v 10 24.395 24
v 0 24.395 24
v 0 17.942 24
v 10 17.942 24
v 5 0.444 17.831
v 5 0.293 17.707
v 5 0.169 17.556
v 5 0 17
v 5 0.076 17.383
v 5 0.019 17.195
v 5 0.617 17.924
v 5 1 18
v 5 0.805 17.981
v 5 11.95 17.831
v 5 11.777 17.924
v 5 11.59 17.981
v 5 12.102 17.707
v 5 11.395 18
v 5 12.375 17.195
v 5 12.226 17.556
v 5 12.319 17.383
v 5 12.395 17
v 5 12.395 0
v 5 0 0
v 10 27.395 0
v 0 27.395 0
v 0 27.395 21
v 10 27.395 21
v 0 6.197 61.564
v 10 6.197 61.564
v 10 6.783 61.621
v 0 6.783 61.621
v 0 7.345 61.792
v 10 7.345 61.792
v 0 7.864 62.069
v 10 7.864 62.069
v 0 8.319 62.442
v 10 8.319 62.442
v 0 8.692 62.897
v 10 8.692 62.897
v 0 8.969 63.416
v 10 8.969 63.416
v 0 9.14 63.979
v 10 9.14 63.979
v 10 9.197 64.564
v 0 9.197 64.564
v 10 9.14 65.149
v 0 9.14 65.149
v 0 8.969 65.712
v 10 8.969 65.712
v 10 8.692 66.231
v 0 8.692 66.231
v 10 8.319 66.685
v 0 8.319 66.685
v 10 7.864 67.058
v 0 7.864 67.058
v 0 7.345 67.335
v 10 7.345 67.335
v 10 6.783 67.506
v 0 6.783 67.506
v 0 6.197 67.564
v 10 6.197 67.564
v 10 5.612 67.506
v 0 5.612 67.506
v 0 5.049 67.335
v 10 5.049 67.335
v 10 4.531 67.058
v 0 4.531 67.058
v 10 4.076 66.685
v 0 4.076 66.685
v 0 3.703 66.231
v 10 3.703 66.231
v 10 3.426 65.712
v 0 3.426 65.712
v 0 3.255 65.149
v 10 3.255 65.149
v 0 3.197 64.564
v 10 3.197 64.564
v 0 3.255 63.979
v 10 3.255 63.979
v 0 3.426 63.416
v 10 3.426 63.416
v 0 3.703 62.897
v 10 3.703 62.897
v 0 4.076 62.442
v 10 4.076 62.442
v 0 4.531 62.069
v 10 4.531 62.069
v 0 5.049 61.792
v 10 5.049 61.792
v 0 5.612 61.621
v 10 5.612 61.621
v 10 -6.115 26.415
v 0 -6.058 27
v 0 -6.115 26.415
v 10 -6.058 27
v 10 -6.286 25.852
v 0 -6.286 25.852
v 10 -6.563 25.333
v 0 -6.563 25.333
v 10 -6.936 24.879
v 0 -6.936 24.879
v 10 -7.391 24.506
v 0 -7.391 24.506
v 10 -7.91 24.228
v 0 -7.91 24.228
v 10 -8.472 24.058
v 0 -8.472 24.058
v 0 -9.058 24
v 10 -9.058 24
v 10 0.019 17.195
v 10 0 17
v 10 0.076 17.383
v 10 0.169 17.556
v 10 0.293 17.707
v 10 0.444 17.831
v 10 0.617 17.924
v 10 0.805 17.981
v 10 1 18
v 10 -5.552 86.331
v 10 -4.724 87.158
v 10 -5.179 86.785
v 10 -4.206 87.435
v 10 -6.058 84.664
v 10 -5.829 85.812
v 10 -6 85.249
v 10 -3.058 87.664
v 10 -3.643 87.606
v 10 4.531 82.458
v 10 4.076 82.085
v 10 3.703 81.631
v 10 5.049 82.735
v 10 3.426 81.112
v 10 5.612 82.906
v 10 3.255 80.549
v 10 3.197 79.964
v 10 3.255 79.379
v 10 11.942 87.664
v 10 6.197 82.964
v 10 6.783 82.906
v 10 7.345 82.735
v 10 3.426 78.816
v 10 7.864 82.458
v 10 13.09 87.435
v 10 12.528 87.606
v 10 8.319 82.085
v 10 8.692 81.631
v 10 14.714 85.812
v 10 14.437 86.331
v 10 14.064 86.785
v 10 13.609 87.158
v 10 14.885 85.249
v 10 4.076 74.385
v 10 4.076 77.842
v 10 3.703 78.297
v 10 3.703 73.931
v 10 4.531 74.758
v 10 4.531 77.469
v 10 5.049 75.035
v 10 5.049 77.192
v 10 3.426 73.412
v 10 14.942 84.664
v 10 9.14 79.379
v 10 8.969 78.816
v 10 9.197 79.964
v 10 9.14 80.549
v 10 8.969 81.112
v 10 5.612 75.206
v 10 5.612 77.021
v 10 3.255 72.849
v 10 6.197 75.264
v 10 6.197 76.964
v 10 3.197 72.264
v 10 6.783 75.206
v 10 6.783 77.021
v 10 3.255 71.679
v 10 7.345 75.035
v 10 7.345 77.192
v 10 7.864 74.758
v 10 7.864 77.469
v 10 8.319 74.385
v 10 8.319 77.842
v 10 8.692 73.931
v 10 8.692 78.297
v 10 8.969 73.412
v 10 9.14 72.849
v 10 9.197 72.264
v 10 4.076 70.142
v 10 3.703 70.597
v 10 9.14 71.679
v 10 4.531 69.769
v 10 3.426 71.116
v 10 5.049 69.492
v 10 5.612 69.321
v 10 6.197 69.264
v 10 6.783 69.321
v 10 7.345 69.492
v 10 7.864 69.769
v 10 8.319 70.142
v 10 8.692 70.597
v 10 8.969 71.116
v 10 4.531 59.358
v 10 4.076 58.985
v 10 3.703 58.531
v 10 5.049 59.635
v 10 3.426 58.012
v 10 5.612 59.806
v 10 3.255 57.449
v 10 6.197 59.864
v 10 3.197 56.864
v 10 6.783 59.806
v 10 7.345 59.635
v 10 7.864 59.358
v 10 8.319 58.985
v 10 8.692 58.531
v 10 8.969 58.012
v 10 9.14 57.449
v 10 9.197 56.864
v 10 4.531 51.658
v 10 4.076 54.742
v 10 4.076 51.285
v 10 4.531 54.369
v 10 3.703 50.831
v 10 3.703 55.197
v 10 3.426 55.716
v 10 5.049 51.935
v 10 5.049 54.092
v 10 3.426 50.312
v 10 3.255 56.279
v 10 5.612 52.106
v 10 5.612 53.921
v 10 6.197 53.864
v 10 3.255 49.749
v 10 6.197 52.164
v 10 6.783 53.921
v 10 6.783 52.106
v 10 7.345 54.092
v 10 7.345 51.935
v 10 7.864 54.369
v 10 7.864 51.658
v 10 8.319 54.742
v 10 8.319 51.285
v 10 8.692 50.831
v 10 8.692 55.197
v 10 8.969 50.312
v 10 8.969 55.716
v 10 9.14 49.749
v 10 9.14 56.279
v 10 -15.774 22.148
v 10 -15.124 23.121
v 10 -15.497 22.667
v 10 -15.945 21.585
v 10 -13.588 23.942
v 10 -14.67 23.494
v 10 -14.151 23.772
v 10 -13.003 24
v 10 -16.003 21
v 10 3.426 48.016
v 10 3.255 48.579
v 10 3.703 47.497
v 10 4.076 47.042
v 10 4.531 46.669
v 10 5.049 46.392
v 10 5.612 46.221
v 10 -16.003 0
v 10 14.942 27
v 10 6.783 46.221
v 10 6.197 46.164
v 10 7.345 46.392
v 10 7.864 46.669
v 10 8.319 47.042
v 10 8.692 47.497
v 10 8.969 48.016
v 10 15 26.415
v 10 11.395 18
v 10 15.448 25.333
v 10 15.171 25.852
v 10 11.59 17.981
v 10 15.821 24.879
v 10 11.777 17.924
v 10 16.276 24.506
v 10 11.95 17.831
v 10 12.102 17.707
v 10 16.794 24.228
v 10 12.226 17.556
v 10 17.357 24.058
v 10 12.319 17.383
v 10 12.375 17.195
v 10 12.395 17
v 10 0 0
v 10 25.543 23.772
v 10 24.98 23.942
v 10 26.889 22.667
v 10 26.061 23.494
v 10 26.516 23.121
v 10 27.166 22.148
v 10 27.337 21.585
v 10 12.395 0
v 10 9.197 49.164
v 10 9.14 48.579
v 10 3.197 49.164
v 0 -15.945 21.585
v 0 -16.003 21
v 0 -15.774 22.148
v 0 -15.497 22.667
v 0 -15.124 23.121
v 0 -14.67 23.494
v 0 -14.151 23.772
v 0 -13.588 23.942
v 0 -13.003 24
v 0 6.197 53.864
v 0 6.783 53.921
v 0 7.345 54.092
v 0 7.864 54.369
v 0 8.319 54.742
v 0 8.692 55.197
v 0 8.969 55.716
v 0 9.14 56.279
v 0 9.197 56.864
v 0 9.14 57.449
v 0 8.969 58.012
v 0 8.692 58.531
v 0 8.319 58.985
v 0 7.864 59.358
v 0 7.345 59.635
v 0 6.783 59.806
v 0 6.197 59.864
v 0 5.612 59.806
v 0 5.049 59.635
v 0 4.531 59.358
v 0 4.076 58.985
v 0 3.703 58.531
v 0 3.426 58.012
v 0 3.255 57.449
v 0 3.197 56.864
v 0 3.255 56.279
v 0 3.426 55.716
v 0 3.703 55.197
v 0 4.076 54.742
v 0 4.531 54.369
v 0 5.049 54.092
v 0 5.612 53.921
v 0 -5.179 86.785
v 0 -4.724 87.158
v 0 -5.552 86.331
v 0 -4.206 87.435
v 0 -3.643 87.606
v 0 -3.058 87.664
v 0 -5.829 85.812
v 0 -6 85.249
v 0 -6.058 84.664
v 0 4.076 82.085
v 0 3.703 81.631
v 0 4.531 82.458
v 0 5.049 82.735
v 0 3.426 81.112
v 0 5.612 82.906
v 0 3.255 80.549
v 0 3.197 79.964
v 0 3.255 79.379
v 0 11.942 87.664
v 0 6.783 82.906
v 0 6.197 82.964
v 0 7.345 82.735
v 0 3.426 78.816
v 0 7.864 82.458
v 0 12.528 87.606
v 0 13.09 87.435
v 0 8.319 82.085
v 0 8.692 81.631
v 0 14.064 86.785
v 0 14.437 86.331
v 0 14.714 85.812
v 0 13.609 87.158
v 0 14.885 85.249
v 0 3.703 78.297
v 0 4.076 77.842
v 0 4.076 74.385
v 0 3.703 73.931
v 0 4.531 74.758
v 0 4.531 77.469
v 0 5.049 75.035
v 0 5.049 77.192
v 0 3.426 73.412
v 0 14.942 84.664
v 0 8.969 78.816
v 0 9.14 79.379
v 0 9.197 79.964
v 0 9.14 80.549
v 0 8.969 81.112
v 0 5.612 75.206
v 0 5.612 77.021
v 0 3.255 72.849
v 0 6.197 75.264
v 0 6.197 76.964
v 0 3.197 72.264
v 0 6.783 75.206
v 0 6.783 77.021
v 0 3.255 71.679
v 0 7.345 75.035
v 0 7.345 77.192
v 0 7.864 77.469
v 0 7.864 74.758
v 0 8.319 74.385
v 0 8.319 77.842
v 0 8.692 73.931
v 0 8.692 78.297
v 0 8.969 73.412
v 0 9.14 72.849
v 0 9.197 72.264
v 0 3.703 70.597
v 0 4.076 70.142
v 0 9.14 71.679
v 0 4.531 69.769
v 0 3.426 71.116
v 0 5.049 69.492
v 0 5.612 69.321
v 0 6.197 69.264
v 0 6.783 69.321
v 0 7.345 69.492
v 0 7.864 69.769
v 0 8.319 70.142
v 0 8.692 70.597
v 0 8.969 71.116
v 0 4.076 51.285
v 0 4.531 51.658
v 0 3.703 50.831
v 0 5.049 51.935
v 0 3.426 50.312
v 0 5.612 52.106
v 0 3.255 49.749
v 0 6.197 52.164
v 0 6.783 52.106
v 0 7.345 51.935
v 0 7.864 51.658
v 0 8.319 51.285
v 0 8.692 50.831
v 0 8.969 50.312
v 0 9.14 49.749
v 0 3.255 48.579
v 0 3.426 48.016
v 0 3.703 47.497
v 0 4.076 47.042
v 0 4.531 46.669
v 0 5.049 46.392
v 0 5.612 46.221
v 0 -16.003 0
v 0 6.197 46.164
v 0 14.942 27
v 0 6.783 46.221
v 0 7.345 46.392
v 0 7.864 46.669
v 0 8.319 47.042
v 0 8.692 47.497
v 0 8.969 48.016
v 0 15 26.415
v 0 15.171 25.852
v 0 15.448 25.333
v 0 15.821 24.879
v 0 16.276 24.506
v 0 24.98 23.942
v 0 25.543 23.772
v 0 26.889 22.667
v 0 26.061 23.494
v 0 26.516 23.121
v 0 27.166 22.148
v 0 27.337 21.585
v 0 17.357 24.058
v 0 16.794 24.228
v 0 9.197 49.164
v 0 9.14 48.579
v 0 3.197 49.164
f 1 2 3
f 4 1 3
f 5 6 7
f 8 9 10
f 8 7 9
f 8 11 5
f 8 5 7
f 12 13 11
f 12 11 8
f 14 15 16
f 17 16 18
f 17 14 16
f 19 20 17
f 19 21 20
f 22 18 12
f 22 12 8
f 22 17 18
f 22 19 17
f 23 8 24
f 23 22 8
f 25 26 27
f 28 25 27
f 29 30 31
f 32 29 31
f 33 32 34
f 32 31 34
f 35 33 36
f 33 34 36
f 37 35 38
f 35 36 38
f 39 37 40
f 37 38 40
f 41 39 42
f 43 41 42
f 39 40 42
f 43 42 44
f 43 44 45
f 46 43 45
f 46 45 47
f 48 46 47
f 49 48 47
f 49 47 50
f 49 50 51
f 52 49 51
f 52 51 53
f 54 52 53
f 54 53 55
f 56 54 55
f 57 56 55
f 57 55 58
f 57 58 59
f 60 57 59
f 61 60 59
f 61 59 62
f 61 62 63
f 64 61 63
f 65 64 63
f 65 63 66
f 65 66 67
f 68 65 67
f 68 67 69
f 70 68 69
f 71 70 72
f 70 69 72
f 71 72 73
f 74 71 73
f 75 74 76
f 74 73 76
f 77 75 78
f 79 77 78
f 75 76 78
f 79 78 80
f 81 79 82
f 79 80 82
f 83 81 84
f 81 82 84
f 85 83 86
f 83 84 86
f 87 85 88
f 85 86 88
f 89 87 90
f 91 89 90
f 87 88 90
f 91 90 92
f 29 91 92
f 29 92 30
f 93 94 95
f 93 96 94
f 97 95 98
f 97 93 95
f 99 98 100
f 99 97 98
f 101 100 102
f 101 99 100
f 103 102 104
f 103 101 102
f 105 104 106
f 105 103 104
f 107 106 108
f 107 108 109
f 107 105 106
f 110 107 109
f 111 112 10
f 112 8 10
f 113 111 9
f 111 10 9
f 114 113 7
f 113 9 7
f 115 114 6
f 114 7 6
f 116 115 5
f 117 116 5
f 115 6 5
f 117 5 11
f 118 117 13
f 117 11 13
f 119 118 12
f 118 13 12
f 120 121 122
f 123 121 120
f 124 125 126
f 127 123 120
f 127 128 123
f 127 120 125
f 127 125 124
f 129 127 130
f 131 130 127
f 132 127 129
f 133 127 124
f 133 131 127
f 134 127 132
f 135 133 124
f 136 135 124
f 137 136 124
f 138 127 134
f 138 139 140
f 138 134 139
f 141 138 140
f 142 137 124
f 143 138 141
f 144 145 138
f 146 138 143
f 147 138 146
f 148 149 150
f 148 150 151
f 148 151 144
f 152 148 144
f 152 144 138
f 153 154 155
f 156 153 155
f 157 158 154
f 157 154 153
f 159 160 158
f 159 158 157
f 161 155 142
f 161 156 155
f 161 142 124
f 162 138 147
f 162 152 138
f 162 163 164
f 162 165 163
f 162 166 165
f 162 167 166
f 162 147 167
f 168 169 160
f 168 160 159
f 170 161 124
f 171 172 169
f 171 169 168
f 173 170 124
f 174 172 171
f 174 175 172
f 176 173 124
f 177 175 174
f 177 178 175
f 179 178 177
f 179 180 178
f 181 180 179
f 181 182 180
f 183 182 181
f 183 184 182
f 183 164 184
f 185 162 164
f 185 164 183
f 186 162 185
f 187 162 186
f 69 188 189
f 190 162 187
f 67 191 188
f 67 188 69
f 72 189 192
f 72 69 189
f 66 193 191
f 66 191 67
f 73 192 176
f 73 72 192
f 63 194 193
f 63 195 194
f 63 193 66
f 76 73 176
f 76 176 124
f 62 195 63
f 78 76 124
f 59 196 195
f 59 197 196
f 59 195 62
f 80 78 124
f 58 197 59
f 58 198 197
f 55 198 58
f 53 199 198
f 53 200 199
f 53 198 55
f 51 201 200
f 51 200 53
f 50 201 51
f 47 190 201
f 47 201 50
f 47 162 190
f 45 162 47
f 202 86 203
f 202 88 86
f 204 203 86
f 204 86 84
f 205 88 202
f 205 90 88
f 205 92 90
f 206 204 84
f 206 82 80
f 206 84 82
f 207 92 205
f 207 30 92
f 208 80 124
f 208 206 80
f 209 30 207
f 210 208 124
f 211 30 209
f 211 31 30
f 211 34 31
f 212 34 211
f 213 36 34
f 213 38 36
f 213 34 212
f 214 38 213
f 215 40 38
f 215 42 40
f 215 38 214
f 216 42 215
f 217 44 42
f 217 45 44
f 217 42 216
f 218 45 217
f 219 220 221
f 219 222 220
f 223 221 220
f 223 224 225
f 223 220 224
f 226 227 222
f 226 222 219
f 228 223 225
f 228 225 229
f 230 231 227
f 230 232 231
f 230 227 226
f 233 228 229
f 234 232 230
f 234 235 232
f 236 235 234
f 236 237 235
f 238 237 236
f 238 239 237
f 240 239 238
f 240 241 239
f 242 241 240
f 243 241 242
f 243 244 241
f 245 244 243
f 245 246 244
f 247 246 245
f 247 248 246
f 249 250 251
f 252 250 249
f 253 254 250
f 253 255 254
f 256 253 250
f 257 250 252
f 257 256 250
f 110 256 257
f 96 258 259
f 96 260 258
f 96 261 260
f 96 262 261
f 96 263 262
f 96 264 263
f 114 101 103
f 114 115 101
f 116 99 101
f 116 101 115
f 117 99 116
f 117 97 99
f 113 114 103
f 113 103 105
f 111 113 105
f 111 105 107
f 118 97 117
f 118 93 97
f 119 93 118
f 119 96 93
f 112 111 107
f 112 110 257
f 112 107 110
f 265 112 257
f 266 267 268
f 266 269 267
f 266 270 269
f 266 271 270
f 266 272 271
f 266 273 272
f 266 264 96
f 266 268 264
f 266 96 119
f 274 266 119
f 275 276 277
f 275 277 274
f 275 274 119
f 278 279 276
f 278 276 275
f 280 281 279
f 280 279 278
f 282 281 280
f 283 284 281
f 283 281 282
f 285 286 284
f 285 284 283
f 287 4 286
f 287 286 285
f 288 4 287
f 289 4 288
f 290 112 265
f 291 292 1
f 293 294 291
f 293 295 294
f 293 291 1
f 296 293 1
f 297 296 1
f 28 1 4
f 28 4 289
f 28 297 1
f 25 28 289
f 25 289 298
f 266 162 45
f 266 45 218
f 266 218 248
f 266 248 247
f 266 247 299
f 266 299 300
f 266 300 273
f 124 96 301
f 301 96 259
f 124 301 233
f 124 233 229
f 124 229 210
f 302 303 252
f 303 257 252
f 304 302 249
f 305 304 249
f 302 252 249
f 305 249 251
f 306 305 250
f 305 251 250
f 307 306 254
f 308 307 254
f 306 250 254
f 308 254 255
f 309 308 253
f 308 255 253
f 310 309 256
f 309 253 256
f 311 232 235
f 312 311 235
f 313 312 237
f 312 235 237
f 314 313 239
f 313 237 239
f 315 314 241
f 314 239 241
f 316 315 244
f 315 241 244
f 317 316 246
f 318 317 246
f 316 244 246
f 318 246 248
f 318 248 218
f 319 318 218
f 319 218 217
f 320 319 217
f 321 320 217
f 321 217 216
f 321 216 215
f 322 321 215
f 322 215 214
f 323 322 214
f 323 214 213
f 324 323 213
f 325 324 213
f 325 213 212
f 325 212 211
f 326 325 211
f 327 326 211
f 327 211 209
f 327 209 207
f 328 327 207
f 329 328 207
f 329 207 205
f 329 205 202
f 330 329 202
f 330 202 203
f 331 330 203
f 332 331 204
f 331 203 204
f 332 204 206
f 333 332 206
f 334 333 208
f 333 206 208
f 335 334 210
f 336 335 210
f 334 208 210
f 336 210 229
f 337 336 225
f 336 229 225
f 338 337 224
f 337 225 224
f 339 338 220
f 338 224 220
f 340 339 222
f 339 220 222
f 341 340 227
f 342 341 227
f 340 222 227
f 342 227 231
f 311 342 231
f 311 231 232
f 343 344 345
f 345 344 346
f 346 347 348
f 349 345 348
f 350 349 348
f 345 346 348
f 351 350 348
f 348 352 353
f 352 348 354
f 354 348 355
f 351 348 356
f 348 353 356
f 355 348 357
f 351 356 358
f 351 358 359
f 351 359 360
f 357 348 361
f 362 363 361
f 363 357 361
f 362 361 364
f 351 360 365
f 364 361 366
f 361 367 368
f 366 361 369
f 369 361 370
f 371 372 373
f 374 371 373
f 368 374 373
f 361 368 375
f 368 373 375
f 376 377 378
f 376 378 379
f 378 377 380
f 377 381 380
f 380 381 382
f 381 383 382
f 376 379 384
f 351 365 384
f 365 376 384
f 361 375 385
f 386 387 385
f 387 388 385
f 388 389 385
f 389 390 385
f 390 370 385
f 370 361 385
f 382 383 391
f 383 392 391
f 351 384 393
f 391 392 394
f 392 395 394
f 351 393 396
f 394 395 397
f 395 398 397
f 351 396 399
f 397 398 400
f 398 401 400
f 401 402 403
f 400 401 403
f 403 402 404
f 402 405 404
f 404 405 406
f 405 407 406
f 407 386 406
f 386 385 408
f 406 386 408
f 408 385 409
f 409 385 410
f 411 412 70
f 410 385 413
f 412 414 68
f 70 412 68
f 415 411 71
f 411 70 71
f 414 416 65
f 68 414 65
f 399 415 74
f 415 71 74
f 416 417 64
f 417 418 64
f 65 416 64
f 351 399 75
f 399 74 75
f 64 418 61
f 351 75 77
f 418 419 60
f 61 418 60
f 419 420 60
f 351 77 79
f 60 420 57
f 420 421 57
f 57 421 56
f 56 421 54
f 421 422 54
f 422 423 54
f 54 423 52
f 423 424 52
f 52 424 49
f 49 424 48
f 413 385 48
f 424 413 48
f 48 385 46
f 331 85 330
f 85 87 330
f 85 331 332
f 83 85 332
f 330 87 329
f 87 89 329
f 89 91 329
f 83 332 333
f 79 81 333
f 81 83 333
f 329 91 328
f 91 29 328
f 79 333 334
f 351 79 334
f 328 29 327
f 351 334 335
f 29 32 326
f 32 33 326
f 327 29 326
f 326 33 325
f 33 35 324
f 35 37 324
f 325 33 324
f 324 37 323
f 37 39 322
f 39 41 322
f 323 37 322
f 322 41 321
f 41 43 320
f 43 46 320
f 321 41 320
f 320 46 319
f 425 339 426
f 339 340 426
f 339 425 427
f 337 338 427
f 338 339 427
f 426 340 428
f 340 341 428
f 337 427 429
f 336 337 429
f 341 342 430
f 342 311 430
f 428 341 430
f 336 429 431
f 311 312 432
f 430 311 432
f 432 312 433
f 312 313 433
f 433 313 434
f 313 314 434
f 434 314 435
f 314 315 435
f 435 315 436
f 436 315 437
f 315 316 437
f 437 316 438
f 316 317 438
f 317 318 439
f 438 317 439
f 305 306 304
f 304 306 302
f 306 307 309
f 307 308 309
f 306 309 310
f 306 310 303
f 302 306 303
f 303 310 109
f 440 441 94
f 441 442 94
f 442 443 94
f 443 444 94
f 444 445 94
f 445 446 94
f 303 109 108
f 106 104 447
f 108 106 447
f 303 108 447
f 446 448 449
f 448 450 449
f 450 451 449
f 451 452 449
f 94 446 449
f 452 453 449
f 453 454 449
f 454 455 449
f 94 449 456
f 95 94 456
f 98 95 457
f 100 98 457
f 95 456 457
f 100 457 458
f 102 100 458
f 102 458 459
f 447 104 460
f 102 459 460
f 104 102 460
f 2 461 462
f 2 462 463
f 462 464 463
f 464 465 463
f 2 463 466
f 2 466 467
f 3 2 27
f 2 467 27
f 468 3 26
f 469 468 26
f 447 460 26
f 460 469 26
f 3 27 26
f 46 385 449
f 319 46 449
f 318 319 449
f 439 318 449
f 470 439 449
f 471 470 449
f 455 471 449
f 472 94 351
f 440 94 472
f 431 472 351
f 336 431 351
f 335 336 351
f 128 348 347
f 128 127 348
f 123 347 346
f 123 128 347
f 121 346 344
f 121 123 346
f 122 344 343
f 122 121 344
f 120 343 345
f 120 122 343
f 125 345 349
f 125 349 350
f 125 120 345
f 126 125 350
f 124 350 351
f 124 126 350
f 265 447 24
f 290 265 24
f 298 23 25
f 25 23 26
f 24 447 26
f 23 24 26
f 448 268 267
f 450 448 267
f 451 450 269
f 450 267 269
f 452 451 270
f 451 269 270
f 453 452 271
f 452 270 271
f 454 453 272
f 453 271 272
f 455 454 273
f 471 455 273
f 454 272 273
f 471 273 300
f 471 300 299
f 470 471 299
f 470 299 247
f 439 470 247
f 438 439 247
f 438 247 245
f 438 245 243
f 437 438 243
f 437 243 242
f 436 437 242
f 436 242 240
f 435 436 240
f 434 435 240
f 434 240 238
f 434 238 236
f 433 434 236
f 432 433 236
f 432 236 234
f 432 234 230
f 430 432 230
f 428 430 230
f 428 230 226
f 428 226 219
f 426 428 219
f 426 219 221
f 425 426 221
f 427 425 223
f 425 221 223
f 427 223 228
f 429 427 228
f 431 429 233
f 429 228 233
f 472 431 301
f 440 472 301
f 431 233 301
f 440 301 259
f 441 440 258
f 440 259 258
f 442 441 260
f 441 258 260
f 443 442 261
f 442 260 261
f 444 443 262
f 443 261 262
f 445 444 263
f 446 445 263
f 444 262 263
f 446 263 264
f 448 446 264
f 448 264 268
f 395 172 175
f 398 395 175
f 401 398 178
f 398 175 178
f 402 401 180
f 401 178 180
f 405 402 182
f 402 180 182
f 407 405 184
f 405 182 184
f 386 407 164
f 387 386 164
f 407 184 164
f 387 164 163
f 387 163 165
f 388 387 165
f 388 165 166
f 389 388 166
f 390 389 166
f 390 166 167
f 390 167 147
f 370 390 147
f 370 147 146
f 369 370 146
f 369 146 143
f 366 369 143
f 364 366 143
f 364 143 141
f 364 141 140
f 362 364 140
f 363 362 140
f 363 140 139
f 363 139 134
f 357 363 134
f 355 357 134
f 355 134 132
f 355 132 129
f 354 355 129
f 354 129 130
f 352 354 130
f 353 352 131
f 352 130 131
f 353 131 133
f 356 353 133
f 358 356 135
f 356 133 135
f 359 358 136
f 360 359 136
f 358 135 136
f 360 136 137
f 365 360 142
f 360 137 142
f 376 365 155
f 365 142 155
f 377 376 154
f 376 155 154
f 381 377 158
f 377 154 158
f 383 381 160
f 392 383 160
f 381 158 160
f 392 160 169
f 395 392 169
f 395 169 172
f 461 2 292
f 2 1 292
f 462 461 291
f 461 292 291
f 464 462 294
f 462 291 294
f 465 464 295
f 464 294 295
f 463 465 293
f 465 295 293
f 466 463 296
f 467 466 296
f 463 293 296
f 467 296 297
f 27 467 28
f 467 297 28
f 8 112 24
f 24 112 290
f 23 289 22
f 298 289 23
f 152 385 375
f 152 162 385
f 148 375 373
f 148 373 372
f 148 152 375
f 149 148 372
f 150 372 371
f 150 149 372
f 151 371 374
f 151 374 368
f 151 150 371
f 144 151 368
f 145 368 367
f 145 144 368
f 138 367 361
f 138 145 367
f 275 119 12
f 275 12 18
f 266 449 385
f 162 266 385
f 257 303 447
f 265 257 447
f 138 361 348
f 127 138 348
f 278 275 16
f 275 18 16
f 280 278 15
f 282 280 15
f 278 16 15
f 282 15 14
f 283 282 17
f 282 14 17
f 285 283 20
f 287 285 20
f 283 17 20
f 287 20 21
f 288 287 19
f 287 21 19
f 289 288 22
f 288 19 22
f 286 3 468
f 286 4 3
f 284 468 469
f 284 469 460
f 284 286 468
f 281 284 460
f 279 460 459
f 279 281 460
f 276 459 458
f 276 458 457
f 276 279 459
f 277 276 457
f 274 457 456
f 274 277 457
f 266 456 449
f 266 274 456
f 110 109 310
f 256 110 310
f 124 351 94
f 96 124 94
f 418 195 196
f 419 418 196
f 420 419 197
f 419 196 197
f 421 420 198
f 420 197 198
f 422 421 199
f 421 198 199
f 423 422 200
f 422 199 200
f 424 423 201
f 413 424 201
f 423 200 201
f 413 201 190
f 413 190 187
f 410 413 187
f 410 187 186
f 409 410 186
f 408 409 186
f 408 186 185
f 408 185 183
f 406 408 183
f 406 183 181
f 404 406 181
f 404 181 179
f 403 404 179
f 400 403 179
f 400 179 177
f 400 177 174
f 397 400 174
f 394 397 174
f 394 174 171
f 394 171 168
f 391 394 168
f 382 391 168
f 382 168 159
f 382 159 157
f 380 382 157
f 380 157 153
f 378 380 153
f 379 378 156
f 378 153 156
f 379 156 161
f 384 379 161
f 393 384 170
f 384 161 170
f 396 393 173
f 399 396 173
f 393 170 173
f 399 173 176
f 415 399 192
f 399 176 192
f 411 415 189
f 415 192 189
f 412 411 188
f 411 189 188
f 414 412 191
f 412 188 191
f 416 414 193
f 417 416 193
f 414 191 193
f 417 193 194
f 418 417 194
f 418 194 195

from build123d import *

# Parameters (mm, degrees)
SALIENTE_EXTRUIR1_DEPTH = 10
CROQUIS2_W              = 18
CROQUIS2_H              = 12.394708995
CORTAR_EXTRUIR1_DEPTH   = 5
REDONDEO1_R             = 3
REDONDEO2_R             = 3
REDONDEO3_R             = 1
CROQUIS3_R              = 3
CORTAR_EXTRUIR2_DEPTH   = 15


with BuildPart() as part:
    # Croquis1 → Saliente-Extruir1 (new body)
    with BuildSketch(Plane(origin=(0, 0, 0), x_dir=(0, 0, -1), z_dir=(1, 0, 0))):
        Polygon((0, -10.216508635), (0, 27.394708995), (-24, 27.394708995), (-24, 14.942424084), (-87.663818946, 14.942424084), (-87.663818946, -6.057575916), (-24, -6.057575916), (-24, -16.002849809), (0, -16.002849809), align=None)
    extrude(amount=SALIENTE_EXTRUIR1_DEPTH)

    # Croquis2 → Cortar-Extruir1 (cut)
    with BuildSketch(Plane(origin=(10, 0, 0), x_dir=(0, 0, -1), z_dir=(1, 0, 0))):
        with Locations((-9, 6.197354498)):
            Rectangle(CROQUIS2_W, CROQUIS2_H)
    extrude(amount=-CORTAR_EXTRUIR1_DEPTH, mode=Mode.SUBTRACT)

    # Redondeo1
    redondeo1_edges = [part.edges().sort_by_distance(p)[0] for p in [
        (5, -6.057575916, 24),
        (5, 14.942424084, 24),
    ]]
    fillet(redondeo1_edges, radius=REDONDEO1_R)

    # Redondeo2
    redondeo2_edges = [part.edges().sort_by_distance(p)[0] for p in [
        (5, -16.002849809, 24),
        (5, -6.057575916, 87.663818946),
        (5, 14.942424084, 87.663818946),
        (5, 27.394708995, 24),
    ]]
    fillet(redondeo2_edges, radius=REDONDEO2_R)

    # Redondeo3
    redondeo3_edges = [part.edges().sort_by_distance(p)[0] for p in [
        (7.5, 0, 18),
        (7.5, 12.394708995, 18),
    ]]
    fillet(redondeo3_edges, radius=REDONDEO3_R)

    # Croquis3 → Cortar-Extruir2 (cut)
    with BuildSketch(Plane(origin=(10, 0, 0), x_dir=(0, 0, -1), z_dir=(1, 0, 0))):
        with Locations((-79.963818946, 6.197354497)):
            Circle(CROQUIS3_R)
        with Locations((-72.263818946, 6.197354497)):
            Circle(CROQUIS3_R)
        with Locations((-64.563818946, 6.197354497)):
            Circle(CROQUIS3_R)
        with Locations((-56.863818946, 6.197354497)):
            Circle(CROQUIS3_R)
        with Locations((-49.163818946, 6.197354497)):
            Circle(CROQUIS3_R)
    extrude(amount=-CORTAR_EXTRUIR2_DEPTH, mode=Mode.SUBTRACT)


solid = part.part
